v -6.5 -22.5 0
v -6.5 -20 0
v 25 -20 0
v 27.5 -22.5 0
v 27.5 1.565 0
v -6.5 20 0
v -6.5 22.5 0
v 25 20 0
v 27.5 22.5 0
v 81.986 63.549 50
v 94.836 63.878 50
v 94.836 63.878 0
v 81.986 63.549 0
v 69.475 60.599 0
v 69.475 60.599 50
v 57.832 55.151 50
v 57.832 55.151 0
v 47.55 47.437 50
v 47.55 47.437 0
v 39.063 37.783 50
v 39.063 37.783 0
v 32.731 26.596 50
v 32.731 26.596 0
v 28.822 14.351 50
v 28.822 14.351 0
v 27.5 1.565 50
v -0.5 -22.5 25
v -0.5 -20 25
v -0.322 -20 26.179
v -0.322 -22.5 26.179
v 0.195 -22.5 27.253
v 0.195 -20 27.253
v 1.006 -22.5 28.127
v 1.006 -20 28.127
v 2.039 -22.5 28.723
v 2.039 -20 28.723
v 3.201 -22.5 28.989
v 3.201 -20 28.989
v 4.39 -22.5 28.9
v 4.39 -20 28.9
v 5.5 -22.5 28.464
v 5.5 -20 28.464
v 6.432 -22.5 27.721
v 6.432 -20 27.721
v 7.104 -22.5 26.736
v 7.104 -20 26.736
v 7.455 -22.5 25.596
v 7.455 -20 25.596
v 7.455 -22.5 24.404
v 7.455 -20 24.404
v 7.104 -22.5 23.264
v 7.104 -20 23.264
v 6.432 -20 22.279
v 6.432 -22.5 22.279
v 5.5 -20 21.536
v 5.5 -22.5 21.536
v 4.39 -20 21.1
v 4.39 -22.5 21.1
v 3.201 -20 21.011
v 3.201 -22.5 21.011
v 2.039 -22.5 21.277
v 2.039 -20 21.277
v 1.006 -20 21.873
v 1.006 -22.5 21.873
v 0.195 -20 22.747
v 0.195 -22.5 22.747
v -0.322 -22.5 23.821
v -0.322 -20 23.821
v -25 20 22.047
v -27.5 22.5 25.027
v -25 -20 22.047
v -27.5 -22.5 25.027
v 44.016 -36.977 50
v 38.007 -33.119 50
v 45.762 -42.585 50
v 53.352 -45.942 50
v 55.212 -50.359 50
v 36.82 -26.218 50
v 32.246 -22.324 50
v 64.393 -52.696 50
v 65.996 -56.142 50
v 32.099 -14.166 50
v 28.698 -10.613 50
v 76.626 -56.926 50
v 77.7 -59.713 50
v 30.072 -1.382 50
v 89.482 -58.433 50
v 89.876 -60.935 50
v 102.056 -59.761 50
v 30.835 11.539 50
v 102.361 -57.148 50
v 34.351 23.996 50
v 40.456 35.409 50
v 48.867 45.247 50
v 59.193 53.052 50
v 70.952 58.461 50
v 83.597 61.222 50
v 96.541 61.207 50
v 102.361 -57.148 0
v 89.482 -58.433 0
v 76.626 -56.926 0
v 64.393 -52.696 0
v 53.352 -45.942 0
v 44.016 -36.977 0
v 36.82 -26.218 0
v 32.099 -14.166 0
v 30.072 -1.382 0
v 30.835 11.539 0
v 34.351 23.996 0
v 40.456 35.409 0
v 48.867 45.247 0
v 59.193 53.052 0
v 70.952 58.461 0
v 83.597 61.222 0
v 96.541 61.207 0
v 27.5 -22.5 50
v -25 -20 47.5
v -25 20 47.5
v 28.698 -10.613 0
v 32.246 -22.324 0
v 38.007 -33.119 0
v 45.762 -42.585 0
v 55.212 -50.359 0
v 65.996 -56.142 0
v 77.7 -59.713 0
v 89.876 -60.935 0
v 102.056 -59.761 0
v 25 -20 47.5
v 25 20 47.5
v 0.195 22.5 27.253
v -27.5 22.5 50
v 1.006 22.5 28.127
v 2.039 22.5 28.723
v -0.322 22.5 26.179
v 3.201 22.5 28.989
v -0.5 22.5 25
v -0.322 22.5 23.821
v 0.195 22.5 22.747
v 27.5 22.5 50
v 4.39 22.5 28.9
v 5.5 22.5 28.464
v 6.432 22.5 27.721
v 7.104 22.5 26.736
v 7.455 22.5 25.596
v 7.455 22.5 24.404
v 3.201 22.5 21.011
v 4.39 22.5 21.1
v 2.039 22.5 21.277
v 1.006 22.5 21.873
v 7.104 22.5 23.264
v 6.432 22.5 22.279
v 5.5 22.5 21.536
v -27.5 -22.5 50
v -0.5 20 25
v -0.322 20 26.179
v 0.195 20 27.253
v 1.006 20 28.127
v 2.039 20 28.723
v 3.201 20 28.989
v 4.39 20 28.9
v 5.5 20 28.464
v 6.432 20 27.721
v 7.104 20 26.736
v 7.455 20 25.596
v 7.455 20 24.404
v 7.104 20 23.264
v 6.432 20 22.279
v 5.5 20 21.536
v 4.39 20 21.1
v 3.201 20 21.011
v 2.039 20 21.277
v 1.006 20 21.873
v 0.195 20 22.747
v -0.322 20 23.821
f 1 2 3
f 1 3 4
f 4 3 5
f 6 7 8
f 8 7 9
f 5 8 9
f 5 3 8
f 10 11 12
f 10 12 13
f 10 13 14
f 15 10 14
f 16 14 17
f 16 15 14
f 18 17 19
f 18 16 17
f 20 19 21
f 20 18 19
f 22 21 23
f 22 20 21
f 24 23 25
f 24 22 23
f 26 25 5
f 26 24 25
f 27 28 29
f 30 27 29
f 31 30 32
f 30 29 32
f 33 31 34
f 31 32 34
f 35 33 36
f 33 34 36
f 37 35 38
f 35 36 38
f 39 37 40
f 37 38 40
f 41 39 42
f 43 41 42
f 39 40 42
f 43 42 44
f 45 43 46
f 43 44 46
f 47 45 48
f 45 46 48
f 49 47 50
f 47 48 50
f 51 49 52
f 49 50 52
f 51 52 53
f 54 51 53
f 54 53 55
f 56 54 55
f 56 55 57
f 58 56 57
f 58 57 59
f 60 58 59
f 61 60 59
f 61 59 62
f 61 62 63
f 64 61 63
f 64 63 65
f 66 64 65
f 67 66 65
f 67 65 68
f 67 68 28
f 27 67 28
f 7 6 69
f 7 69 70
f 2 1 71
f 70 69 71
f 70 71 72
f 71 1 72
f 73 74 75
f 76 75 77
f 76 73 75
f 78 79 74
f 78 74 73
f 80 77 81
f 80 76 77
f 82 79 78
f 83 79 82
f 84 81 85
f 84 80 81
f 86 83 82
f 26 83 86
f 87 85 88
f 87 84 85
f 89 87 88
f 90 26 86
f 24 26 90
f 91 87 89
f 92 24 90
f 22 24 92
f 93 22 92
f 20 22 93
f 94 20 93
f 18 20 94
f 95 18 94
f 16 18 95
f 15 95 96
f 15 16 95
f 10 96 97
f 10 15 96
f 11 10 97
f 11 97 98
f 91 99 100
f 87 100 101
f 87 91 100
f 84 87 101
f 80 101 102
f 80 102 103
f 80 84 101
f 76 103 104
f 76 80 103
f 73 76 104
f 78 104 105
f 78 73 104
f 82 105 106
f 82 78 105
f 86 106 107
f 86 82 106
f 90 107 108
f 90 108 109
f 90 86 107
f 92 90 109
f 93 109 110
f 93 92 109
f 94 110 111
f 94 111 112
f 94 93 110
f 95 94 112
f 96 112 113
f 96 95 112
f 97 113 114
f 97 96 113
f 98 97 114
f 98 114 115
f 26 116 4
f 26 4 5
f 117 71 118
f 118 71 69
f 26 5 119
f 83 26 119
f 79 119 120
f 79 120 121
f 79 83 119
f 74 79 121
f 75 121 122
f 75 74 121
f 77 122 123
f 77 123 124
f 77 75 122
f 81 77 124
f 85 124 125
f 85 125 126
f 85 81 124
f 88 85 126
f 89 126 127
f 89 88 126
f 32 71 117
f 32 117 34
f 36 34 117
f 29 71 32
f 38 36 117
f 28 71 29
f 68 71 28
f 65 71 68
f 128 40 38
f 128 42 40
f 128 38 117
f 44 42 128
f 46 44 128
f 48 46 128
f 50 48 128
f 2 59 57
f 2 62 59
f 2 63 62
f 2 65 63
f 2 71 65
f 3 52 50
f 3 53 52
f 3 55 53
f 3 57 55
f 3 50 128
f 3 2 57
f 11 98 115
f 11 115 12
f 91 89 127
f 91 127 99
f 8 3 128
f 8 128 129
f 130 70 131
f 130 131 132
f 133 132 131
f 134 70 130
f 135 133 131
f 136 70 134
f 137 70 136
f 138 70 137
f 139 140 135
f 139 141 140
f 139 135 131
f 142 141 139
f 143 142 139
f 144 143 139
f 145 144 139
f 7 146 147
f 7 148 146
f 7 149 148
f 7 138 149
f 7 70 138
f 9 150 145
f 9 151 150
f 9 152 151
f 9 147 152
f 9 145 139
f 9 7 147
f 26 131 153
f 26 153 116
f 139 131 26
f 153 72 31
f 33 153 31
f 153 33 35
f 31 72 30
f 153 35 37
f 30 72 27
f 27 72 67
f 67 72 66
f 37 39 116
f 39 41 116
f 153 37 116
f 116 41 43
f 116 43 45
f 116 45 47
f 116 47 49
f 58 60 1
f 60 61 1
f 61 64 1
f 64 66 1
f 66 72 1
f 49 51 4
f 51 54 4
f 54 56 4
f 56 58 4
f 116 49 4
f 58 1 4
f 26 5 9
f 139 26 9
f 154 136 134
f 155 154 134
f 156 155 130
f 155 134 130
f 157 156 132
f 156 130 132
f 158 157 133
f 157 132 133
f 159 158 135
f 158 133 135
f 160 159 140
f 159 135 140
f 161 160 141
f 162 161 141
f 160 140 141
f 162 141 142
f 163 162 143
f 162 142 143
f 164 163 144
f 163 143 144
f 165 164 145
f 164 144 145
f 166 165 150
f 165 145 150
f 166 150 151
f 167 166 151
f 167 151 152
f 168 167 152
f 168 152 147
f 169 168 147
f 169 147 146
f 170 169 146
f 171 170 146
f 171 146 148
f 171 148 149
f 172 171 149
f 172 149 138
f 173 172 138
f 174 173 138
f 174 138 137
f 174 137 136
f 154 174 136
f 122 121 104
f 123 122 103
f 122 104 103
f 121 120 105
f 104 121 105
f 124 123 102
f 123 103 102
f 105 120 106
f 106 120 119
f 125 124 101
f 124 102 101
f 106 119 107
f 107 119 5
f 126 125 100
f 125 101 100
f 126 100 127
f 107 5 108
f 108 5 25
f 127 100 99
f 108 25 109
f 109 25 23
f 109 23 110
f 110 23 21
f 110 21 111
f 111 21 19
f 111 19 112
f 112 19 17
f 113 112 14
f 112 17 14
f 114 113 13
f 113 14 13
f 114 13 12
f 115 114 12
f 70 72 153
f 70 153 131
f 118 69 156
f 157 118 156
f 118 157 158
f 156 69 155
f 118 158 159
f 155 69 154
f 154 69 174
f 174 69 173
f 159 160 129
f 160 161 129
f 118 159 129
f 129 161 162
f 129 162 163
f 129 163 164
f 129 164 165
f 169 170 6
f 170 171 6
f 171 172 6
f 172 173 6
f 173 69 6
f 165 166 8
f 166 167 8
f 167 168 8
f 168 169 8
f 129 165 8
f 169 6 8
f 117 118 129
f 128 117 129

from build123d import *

# Parameters (mm, degrees)
F0_W     = 55
F0_H     = 45
F1_DEPTH = 50
F2_T     = -2.5
F3_R     = 4
F4_DEPTH = 45.001
F6_DEPTH = 50
F8_DEPTH = 86.566062


with BuildPart() as f1:
    # F0 (on Top) → F1 (new body)
    with BuildSketch(Plane.XY):
        Rectangle(F0_W, F0_H)
    extrude(amount=F1_DEPTH)

    # F2
    f2_openings = [f1.faces().sort_by_distance(p)[0] for p in [
        (0, 0, 0),
    ]]
    offset(amount=F2_T, openings=f2_openings)

    # F3 (on face) → F4 (cut, through all)
    with BuildSketch(Plane(origin=(0, 22.5, 0), x_dir=(-1, 0, 0), z_dir=(0, 1, 0))):
        with Locations((-3.5, 25)):
            Circle(F3_R)
    extrude(amount=-F4_DEPTH, mode=Mode.SUBTRACT)

    # F5 (on face) → F6 (join)
    with BuildSketch(Plane.XY.offset(50)):
        with BuildLine():
            ThreePointArc((102.361413, -57.14776), (30.07243, -1.382195), (96.540663, 61.207495))
            Line((96.540663, 61.207495), (94.836164, 63.877674))
            ThreePointArc((94.836164, 63.877674), (47.55009, 47.437223), (27.5, 1.565062))
            ThreePointArc((27.5, 1.565062), (50.296396, -46.703704), (102.055963, -59.761145))
            Line((102.055963, -59.761145), (102.361413, -57.14776))
        make_face()
    extrude(amount=-F6_DEPTH)

    # F7 (on face) → F8 (cut, through all)
    with BuildSketch(Plane.XZ.offset(22.5)):
        Polygon((-6.5, 0), (-27.5, 25.026825), (-27.5, 0), align=None)
    extrude(amount=-F8_DEPTH, mode=Mode.SUBTRACT)


solid = f1.part
